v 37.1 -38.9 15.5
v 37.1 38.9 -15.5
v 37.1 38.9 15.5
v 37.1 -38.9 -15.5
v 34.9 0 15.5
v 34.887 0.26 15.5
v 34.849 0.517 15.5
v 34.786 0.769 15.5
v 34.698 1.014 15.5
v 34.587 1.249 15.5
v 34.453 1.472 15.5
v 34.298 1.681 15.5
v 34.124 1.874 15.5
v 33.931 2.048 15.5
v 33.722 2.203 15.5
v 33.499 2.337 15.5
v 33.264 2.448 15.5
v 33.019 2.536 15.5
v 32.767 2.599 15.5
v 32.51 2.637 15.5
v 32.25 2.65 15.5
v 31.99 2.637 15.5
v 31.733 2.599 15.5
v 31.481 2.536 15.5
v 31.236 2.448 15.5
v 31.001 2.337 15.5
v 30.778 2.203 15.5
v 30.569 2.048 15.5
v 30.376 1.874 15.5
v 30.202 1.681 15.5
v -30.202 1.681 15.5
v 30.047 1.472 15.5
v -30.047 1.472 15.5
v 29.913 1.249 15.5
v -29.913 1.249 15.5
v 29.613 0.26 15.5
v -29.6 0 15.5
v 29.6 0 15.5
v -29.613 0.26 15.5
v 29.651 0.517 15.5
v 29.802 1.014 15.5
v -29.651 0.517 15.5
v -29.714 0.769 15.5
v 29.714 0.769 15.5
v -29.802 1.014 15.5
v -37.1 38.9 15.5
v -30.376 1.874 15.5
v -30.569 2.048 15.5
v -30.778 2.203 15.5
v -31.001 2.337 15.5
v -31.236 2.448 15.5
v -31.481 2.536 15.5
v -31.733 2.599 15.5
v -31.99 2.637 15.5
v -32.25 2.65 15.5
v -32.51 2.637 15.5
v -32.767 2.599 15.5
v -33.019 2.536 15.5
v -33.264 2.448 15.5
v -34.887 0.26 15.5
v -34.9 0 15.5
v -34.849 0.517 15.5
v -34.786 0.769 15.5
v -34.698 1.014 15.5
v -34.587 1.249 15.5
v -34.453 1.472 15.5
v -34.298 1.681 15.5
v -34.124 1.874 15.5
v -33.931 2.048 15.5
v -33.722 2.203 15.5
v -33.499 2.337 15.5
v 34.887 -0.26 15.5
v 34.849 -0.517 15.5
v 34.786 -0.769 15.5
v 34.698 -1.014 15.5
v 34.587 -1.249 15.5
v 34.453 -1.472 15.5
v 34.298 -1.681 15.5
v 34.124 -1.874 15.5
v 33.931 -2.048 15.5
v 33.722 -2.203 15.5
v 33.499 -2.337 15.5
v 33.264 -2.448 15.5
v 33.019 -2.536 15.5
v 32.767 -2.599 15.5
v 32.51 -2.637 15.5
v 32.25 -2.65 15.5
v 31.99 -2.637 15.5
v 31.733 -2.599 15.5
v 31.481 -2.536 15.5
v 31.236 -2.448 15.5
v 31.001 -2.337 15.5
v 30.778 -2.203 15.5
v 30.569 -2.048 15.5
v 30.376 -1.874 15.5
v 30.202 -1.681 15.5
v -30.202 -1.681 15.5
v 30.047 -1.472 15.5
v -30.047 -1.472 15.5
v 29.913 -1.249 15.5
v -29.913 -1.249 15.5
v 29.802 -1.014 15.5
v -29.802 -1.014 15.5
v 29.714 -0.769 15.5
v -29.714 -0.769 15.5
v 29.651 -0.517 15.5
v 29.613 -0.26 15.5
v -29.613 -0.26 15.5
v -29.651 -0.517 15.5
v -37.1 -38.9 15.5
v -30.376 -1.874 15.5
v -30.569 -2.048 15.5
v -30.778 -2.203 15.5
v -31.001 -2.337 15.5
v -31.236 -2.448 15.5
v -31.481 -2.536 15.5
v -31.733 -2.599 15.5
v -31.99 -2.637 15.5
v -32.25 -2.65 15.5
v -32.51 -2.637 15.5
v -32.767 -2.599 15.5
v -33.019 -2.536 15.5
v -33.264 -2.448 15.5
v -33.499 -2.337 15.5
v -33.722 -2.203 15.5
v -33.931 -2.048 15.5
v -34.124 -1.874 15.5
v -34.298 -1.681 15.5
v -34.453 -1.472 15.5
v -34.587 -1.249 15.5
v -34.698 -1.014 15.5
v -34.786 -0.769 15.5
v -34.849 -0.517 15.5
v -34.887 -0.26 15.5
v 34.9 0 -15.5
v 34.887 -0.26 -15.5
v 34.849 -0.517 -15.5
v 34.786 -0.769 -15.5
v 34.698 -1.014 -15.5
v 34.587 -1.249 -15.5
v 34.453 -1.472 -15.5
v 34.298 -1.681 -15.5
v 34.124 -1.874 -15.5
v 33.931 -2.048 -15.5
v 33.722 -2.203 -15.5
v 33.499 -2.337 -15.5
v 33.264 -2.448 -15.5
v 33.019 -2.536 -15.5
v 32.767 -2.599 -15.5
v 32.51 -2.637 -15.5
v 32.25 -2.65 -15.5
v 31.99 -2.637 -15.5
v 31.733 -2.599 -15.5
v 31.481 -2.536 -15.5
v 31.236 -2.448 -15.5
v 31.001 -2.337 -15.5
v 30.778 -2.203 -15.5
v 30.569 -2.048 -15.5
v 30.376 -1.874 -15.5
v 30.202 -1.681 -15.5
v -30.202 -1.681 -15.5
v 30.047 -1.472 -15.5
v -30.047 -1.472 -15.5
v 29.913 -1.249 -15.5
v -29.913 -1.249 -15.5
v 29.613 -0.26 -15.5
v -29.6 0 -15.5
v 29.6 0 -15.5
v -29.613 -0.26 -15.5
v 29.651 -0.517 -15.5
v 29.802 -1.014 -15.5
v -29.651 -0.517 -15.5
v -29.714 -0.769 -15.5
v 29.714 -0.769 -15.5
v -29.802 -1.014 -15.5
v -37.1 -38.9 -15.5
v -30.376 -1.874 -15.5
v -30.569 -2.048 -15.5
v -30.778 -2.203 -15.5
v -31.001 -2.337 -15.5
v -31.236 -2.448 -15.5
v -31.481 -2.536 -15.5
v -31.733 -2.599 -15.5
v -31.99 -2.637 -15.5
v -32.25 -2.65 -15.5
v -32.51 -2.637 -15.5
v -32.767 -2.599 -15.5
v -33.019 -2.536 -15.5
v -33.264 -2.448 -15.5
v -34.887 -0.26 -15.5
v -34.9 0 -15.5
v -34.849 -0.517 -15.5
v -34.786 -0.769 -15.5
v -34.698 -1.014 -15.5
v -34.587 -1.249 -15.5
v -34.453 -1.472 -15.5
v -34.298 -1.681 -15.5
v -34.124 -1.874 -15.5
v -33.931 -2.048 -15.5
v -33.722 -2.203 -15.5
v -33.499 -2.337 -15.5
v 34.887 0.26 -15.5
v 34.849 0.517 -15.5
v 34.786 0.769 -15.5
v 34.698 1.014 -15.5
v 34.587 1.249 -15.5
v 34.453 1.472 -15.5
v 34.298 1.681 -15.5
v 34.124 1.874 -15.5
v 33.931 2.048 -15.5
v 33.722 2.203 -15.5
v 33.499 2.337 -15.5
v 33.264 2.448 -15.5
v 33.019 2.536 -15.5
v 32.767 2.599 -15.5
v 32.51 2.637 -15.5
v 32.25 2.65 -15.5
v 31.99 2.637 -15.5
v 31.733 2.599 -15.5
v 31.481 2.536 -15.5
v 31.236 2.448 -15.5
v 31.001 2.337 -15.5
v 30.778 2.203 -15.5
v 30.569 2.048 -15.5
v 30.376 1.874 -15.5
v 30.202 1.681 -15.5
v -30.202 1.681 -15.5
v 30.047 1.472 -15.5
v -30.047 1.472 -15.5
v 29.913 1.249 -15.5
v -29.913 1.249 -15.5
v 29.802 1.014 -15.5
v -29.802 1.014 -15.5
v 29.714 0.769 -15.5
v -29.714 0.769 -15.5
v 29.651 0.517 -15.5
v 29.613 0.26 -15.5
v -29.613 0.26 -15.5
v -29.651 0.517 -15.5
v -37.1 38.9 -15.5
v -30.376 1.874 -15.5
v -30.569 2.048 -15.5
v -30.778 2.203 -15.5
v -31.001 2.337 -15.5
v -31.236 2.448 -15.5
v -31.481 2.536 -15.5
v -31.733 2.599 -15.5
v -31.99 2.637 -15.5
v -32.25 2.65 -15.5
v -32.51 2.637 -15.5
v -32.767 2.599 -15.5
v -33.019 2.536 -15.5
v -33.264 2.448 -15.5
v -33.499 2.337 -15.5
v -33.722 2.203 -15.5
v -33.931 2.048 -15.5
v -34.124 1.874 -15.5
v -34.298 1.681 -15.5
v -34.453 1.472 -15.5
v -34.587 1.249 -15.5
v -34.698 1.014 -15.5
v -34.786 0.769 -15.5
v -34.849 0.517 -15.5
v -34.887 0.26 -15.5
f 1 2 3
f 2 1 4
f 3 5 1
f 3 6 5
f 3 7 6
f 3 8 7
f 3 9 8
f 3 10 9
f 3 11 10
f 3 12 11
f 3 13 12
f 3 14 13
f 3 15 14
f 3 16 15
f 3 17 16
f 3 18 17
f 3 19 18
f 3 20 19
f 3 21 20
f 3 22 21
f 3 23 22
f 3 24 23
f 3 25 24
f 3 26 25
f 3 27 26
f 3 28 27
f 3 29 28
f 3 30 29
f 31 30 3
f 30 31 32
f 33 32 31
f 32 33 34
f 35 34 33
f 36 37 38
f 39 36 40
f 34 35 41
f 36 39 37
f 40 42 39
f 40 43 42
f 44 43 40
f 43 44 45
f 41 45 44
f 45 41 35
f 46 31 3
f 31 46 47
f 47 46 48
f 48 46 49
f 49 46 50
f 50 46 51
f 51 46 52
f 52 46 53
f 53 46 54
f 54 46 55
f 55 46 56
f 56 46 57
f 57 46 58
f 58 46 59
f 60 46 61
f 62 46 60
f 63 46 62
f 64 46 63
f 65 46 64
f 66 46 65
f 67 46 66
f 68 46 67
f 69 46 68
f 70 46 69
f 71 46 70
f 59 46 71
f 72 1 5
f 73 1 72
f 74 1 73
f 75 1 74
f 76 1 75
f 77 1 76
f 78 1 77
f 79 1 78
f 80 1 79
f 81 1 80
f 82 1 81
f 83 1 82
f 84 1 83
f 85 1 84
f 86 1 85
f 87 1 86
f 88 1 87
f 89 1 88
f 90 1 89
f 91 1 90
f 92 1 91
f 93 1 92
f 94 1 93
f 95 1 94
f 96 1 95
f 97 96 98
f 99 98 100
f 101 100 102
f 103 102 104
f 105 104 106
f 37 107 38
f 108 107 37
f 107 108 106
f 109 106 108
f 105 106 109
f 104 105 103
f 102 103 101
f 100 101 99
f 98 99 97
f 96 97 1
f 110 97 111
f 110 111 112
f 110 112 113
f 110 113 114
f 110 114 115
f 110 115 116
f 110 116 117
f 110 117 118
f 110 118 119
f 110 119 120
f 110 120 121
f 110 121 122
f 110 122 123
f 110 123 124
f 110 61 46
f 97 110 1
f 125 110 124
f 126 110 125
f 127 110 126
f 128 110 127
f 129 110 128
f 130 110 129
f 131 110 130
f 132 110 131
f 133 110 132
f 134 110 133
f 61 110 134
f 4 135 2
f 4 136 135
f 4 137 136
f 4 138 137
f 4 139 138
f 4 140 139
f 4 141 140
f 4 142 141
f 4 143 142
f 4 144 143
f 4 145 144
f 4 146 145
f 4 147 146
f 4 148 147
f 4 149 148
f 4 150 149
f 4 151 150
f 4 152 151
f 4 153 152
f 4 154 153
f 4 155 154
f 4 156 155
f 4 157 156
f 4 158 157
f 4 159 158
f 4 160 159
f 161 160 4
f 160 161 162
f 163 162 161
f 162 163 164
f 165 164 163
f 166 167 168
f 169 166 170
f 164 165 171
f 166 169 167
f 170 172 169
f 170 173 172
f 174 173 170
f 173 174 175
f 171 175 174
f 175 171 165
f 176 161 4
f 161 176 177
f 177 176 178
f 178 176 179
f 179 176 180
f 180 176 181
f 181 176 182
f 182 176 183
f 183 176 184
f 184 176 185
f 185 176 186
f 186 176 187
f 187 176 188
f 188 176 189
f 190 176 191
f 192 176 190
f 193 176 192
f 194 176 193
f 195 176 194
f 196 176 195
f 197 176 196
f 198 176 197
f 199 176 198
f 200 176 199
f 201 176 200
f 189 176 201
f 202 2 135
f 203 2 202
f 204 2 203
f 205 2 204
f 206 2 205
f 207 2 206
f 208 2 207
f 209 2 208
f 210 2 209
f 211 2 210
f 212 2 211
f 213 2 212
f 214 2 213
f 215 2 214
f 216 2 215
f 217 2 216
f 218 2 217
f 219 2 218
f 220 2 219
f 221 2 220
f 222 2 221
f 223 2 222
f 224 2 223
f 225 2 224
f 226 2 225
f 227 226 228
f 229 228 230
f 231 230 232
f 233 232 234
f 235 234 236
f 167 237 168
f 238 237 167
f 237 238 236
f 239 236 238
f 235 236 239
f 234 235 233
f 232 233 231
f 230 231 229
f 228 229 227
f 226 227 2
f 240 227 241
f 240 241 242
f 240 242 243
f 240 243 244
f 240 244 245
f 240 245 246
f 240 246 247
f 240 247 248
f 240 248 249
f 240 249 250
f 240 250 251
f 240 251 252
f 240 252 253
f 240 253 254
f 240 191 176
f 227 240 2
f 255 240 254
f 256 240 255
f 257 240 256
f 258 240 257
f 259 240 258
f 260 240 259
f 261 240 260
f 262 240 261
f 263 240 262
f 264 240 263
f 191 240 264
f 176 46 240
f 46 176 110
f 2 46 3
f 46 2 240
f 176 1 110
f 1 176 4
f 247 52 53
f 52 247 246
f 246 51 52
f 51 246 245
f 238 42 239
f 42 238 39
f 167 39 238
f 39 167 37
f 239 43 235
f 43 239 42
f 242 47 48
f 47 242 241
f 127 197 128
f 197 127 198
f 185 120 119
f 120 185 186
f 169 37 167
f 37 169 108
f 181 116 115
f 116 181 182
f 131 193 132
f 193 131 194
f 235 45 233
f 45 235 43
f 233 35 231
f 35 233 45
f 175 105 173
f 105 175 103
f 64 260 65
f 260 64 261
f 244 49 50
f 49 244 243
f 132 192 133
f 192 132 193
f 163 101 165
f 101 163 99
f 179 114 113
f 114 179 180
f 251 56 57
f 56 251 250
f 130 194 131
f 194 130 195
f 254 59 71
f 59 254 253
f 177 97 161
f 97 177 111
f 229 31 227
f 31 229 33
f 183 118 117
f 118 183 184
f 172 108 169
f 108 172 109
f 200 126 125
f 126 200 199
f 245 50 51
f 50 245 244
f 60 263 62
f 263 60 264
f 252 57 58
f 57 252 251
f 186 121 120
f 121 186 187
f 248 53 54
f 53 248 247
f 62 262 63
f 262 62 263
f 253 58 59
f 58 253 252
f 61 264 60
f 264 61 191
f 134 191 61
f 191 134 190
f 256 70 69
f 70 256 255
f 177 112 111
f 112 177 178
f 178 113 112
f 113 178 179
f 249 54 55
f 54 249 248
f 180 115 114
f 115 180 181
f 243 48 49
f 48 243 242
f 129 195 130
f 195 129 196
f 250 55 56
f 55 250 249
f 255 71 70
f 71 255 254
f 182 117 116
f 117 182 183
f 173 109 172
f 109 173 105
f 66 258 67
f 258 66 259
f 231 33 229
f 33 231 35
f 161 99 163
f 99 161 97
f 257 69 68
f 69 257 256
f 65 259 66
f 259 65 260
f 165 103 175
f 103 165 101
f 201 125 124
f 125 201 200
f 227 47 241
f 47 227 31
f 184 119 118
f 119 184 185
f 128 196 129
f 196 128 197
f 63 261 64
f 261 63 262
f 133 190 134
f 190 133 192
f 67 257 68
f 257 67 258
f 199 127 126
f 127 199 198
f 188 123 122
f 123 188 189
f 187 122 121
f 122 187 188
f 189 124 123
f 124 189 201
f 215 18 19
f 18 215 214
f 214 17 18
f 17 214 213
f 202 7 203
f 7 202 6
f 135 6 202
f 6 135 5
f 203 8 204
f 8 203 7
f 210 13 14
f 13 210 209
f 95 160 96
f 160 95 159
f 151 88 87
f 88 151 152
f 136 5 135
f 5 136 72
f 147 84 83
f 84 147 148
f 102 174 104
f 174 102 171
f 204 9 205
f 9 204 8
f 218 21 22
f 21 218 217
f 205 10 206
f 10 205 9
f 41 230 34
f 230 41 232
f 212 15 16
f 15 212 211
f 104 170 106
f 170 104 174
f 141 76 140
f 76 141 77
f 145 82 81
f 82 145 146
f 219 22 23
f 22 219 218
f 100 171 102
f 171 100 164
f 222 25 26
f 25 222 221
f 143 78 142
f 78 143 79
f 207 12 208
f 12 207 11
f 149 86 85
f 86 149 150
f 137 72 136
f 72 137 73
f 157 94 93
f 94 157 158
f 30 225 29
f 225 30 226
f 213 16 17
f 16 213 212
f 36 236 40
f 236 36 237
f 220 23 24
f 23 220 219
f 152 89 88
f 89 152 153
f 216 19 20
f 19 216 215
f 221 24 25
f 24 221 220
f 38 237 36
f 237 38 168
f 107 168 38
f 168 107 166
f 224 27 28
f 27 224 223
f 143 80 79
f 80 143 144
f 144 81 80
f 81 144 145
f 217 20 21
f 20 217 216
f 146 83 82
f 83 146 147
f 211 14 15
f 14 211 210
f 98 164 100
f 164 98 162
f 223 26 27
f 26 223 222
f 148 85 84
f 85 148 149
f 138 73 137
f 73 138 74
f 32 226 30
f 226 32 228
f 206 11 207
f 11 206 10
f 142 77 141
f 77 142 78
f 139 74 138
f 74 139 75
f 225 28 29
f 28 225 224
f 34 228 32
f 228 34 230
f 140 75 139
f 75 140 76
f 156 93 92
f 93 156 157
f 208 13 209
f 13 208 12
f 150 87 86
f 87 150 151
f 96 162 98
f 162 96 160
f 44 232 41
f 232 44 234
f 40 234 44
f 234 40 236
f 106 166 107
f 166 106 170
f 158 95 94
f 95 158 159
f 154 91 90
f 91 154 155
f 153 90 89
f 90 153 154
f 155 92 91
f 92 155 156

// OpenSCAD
$fn = 64;
POWER_WIDTH = 74.2;
POWER_DEPTH = 77.8;
POWER_HEIGHT = 31.0;
POWER_HOLE_DIAM = 5.3;
POWER_HOLE_X_DIST = 64.5;
POWER_MOUNT_HEIGHT = 4;
POWER_SCREW_DIAM = POWER_HOLE_DIAM * 0.9;

module power(){
  difference(){
    /* Body */
    union(){
      cube([POWER_WIDTH, POWER_DEPTH, POWER_HEIGHT], true);
    }
    /* Left screw hole */
    translate([-POWER_HOLE_X_DIST / 2, 0, 0]){
      cylinder(POWER_DEPTH * 2, POWER_HOLE_DIAM / 2, POWER_HOLE_DIAM / 2, true);
    }
    /* Right screw hole */
    translate([POWER_HOLE_X_DIST / 2, 0, 0]){
      cylinder(POWER_DEPTH * 2, POWER_HOLE_DIAM / 2, POWER_HOLE_DIAM / 2, true);
    }
  }
}

power();
